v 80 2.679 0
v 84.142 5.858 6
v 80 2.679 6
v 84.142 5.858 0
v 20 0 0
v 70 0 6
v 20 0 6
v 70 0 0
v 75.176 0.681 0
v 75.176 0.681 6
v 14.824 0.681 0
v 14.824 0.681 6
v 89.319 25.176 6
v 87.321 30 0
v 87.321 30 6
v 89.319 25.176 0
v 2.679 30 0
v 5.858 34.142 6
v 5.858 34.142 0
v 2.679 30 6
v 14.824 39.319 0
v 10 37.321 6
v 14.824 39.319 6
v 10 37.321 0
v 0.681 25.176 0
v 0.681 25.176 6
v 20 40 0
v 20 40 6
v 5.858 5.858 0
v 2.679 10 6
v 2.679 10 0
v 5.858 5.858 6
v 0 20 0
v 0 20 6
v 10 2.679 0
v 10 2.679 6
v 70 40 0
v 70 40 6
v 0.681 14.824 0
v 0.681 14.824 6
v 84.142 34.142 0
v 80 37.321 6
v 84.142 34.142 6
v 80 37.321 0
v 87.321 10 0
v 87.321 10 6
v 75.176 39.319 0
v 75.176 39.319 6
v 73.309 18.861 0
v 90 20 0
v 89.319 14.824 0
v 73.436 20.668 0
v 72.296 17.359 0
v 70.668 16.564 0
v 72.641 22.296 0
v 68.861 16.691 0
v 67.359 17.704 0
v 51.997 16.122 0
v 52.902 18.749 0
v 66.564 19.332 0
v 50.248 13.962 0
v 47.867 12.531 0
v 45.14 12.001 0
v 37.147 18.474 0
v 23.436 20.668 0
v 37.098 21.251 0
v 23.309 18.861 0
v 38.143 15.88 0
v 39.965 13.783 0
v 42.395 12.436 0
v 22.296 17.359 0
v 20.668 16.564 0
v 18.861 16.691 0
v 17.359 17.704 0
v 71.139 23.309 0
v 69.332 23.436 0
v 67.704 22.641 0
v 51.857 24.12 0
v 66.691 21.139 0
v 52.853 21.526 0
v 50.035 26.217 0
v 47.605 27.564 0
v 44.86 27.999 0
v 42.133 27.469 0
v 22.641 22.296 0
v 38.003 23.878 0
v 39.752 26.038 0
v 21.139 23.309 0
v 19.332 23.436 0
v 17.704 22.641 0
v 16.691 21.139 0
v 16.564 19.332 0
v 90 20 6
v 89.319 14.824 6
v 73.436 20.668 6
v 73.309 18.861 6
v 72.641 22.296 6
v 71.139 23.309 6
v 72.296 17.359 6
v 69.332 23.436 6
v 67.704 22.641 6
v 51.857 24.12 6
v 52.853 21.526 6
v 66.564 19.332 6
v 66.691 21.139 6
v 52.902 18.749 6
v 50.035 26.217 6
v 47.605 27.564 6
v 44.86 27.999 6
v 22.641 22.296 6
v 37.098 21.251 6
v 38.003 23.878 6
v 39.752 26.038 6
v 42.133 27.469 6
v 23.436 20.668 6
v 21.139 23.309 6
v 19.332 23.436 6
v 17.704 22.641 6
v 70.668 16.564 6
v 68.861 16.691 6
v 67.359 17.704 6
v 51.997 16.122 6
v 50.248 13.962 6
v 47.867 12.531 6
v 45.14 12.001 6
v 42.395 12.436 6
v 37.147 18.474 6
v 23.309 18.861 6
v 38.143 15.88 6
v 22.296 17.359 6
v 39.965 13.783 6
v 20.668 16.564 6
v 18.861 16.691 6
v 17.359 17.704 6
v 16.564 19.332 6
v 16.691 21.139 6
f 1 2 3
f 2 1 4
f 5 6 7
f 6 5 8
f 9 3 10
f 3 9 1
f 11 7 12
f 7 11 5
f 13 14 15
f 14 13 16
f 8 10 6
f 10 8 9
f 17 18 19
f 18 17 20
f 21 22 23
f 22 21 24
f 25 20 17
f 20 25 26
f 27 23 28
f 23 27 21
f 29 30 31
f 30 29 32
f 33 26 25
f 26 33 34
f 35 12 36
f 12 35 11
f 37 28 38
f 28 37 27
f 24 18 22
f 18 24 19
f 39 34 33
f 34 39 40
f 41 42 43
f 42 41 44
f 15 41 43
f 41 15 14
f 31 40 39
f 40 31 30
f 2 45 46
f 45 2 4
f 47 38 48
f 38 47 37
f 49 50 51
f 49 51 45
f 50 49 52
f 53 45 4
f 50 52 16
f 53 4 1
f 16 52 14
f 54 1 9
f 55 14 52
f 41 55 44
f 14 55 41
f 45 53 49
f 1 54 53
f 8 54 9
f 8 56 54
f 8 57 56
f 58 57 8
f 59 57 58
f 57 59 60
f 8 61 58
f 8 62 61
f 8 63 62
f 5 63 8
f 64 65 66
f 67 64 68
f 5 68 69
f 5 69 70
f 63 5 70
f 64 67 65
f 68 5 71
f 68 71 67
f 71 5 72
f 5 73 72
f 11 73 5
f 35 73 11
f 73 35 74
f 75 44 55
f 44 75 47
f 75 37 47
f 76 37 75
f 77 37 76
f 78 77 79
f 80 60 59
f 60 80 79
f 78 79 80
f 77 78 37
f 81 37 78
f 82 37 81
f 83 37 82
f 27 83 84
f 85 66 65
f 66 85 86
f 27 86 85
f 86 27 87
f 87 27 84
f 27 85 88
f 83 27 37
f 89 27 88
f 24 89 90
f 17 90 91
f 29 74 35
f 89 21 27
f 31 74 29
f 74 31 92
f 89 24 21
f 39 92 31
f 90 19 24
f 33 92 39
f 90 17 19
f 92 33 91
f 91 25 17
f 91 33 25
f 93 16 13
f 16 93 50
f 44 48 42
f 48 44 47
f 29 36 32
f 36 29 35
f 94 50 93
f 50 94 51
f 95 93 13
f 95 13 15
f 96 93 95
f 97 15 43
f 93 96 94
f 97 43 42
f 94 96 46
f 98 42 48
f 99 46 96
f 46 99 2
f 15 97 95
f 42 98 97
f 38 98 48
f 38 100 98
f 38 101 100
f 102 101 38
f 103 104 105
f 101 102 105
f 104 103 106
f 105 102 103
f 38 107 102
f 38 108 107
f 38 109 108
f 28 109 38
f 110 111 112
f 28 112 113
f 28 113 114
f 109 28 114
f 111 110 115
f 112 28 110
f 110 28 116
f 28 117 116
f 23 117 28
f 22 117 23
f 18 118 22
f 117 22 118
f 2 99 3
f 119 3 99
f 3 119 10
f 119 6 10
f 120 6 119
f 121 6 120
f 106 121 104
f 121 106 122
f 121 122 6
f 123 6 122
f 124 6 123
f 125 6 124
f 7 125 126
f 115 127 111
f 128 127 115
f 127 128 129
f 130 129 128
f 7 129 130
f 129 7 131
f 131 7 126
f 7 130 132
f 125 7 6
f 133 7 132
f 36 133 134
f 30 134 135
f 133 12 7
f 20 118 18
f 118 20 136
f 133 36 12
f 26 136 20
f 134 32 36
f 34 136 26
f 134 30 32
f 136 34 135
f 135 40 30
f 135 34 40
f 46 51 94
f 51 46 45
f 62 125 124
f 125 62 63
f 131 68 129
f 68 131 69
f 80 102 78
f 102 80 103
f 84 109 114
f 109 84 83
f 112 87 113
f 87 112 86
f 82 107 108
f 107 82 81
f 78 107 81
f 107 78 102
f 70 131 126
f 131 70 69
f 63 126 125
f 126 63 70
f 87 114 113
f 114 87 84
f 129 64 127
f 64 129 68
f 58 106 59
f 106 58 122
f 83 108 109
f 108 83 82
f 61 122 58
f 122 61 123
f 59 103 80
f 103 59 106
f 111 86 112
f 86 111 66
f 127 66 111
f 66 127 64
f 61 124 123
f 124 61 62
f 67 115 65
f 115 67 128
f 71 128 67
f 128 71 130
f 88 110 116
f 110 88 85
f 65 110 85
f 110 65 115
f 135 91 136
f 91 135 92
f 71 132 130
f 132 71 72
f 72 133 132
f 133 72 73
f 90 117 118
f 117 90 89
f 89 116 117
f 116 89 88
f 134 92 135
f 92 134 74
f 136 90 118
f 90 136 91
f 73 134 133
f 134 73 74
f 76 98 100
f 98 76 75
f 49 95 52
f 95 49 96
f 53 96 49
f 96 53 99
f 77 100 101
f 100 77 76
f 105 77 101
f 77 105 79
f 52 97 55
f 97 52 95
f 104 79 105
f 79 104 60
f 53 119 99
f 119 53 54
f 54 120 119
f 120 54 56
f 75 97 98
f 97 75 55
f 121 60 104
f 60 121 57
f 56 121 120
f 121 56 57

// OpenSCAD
$fn = 32;

// ----------------------------------------------------------------------
// Spacer plate: obround span 50, caps R20
// ----------------------------------------------------------------------

// --- parameters (mm) ---
bore_r = 8;               // centre bore radius
bolt_r = 3.5;             // bolt hole radius
plate_t = 6;              // plate thickness, Z (extrusion height)
span = 50;                // obround span
cap_r = 20;               // cap radius

profile = [[20, 40], [14.824, 39.319], [10, 37.321], [5.858, 34.142], [2.679, 30], [0.681, 25.176], [0, 20], [0.681, 14.824], [2.679, 10], [5.858, 5.858], [10, 2.679], [14.824, 0.681], [20, 0], [70, 0], [75.176, 0.681], [80, 2.679], [84.142, 5.858], [87.321, 10], [89.319, 14.824], [90, 20], [89.319, 25.176], [87.321, 30], [84.142, 34.142], [80, 37.321], [75.176, 39.319], [70, 40]];  // primary outline, 26 points, counter clockwise
void_1 = [[52.853, 21.526], [51.857, 24.12], [50.035, 26.217], [47.605, 27.564], [44.86, 27.999], [42.133, 27.469], [39.752, 26.038], [38.003, 23.878], [37.098, 21.251], [37.147, 18.474], [38.143, 15.88], [39.965, 13.783], [42.395, 12.436], [45.14, 12.001], [47.867, 12.531], [50.248, 13.962], [51.997, 16.122], [52.902, 18.749]];  // centre bore, 18 points
void_2 = [[23.436, 20.668], [22.641, 22.296], [21.139, 23.309], [19.332, 23.436], [17.704, 22.641], [16.691, 21.139], [16.564, 19.332], [17.359, 17.704], [18.861, 16.691], [20.668, 16.564], [22.296, 17.359], [23.309, 18.861]];  // end hole, 12 points
void_3 = [[73.436, 20.668], [72.641, 22.296], [71.139, 23.309], [69.332, 23.436], [67.704, 22.641], [66.691, 21.139], [66.564, 19.332], [67.359, 17.704], [68.861, 16.691], [70.668, 16.564], [72.296, 17.359], [73.309, 18.861]];  // end hole, 12 points

// --- the one profile operation ---
difference() {
  linear_extrude(height = plate_t) polygon(points = profile);
  translate([0, 0, -1])
    linear_extrude(height = plate_t + 2) polygon(points = void_1);
  translate([0, 0, -1])
    linear_extrude(height = plate_t + 2) polygon(points = void_2);
  translate([0, 0, -1])
    linear_extrude(height = plate_t + 2) polygon(points = void_3);
}
